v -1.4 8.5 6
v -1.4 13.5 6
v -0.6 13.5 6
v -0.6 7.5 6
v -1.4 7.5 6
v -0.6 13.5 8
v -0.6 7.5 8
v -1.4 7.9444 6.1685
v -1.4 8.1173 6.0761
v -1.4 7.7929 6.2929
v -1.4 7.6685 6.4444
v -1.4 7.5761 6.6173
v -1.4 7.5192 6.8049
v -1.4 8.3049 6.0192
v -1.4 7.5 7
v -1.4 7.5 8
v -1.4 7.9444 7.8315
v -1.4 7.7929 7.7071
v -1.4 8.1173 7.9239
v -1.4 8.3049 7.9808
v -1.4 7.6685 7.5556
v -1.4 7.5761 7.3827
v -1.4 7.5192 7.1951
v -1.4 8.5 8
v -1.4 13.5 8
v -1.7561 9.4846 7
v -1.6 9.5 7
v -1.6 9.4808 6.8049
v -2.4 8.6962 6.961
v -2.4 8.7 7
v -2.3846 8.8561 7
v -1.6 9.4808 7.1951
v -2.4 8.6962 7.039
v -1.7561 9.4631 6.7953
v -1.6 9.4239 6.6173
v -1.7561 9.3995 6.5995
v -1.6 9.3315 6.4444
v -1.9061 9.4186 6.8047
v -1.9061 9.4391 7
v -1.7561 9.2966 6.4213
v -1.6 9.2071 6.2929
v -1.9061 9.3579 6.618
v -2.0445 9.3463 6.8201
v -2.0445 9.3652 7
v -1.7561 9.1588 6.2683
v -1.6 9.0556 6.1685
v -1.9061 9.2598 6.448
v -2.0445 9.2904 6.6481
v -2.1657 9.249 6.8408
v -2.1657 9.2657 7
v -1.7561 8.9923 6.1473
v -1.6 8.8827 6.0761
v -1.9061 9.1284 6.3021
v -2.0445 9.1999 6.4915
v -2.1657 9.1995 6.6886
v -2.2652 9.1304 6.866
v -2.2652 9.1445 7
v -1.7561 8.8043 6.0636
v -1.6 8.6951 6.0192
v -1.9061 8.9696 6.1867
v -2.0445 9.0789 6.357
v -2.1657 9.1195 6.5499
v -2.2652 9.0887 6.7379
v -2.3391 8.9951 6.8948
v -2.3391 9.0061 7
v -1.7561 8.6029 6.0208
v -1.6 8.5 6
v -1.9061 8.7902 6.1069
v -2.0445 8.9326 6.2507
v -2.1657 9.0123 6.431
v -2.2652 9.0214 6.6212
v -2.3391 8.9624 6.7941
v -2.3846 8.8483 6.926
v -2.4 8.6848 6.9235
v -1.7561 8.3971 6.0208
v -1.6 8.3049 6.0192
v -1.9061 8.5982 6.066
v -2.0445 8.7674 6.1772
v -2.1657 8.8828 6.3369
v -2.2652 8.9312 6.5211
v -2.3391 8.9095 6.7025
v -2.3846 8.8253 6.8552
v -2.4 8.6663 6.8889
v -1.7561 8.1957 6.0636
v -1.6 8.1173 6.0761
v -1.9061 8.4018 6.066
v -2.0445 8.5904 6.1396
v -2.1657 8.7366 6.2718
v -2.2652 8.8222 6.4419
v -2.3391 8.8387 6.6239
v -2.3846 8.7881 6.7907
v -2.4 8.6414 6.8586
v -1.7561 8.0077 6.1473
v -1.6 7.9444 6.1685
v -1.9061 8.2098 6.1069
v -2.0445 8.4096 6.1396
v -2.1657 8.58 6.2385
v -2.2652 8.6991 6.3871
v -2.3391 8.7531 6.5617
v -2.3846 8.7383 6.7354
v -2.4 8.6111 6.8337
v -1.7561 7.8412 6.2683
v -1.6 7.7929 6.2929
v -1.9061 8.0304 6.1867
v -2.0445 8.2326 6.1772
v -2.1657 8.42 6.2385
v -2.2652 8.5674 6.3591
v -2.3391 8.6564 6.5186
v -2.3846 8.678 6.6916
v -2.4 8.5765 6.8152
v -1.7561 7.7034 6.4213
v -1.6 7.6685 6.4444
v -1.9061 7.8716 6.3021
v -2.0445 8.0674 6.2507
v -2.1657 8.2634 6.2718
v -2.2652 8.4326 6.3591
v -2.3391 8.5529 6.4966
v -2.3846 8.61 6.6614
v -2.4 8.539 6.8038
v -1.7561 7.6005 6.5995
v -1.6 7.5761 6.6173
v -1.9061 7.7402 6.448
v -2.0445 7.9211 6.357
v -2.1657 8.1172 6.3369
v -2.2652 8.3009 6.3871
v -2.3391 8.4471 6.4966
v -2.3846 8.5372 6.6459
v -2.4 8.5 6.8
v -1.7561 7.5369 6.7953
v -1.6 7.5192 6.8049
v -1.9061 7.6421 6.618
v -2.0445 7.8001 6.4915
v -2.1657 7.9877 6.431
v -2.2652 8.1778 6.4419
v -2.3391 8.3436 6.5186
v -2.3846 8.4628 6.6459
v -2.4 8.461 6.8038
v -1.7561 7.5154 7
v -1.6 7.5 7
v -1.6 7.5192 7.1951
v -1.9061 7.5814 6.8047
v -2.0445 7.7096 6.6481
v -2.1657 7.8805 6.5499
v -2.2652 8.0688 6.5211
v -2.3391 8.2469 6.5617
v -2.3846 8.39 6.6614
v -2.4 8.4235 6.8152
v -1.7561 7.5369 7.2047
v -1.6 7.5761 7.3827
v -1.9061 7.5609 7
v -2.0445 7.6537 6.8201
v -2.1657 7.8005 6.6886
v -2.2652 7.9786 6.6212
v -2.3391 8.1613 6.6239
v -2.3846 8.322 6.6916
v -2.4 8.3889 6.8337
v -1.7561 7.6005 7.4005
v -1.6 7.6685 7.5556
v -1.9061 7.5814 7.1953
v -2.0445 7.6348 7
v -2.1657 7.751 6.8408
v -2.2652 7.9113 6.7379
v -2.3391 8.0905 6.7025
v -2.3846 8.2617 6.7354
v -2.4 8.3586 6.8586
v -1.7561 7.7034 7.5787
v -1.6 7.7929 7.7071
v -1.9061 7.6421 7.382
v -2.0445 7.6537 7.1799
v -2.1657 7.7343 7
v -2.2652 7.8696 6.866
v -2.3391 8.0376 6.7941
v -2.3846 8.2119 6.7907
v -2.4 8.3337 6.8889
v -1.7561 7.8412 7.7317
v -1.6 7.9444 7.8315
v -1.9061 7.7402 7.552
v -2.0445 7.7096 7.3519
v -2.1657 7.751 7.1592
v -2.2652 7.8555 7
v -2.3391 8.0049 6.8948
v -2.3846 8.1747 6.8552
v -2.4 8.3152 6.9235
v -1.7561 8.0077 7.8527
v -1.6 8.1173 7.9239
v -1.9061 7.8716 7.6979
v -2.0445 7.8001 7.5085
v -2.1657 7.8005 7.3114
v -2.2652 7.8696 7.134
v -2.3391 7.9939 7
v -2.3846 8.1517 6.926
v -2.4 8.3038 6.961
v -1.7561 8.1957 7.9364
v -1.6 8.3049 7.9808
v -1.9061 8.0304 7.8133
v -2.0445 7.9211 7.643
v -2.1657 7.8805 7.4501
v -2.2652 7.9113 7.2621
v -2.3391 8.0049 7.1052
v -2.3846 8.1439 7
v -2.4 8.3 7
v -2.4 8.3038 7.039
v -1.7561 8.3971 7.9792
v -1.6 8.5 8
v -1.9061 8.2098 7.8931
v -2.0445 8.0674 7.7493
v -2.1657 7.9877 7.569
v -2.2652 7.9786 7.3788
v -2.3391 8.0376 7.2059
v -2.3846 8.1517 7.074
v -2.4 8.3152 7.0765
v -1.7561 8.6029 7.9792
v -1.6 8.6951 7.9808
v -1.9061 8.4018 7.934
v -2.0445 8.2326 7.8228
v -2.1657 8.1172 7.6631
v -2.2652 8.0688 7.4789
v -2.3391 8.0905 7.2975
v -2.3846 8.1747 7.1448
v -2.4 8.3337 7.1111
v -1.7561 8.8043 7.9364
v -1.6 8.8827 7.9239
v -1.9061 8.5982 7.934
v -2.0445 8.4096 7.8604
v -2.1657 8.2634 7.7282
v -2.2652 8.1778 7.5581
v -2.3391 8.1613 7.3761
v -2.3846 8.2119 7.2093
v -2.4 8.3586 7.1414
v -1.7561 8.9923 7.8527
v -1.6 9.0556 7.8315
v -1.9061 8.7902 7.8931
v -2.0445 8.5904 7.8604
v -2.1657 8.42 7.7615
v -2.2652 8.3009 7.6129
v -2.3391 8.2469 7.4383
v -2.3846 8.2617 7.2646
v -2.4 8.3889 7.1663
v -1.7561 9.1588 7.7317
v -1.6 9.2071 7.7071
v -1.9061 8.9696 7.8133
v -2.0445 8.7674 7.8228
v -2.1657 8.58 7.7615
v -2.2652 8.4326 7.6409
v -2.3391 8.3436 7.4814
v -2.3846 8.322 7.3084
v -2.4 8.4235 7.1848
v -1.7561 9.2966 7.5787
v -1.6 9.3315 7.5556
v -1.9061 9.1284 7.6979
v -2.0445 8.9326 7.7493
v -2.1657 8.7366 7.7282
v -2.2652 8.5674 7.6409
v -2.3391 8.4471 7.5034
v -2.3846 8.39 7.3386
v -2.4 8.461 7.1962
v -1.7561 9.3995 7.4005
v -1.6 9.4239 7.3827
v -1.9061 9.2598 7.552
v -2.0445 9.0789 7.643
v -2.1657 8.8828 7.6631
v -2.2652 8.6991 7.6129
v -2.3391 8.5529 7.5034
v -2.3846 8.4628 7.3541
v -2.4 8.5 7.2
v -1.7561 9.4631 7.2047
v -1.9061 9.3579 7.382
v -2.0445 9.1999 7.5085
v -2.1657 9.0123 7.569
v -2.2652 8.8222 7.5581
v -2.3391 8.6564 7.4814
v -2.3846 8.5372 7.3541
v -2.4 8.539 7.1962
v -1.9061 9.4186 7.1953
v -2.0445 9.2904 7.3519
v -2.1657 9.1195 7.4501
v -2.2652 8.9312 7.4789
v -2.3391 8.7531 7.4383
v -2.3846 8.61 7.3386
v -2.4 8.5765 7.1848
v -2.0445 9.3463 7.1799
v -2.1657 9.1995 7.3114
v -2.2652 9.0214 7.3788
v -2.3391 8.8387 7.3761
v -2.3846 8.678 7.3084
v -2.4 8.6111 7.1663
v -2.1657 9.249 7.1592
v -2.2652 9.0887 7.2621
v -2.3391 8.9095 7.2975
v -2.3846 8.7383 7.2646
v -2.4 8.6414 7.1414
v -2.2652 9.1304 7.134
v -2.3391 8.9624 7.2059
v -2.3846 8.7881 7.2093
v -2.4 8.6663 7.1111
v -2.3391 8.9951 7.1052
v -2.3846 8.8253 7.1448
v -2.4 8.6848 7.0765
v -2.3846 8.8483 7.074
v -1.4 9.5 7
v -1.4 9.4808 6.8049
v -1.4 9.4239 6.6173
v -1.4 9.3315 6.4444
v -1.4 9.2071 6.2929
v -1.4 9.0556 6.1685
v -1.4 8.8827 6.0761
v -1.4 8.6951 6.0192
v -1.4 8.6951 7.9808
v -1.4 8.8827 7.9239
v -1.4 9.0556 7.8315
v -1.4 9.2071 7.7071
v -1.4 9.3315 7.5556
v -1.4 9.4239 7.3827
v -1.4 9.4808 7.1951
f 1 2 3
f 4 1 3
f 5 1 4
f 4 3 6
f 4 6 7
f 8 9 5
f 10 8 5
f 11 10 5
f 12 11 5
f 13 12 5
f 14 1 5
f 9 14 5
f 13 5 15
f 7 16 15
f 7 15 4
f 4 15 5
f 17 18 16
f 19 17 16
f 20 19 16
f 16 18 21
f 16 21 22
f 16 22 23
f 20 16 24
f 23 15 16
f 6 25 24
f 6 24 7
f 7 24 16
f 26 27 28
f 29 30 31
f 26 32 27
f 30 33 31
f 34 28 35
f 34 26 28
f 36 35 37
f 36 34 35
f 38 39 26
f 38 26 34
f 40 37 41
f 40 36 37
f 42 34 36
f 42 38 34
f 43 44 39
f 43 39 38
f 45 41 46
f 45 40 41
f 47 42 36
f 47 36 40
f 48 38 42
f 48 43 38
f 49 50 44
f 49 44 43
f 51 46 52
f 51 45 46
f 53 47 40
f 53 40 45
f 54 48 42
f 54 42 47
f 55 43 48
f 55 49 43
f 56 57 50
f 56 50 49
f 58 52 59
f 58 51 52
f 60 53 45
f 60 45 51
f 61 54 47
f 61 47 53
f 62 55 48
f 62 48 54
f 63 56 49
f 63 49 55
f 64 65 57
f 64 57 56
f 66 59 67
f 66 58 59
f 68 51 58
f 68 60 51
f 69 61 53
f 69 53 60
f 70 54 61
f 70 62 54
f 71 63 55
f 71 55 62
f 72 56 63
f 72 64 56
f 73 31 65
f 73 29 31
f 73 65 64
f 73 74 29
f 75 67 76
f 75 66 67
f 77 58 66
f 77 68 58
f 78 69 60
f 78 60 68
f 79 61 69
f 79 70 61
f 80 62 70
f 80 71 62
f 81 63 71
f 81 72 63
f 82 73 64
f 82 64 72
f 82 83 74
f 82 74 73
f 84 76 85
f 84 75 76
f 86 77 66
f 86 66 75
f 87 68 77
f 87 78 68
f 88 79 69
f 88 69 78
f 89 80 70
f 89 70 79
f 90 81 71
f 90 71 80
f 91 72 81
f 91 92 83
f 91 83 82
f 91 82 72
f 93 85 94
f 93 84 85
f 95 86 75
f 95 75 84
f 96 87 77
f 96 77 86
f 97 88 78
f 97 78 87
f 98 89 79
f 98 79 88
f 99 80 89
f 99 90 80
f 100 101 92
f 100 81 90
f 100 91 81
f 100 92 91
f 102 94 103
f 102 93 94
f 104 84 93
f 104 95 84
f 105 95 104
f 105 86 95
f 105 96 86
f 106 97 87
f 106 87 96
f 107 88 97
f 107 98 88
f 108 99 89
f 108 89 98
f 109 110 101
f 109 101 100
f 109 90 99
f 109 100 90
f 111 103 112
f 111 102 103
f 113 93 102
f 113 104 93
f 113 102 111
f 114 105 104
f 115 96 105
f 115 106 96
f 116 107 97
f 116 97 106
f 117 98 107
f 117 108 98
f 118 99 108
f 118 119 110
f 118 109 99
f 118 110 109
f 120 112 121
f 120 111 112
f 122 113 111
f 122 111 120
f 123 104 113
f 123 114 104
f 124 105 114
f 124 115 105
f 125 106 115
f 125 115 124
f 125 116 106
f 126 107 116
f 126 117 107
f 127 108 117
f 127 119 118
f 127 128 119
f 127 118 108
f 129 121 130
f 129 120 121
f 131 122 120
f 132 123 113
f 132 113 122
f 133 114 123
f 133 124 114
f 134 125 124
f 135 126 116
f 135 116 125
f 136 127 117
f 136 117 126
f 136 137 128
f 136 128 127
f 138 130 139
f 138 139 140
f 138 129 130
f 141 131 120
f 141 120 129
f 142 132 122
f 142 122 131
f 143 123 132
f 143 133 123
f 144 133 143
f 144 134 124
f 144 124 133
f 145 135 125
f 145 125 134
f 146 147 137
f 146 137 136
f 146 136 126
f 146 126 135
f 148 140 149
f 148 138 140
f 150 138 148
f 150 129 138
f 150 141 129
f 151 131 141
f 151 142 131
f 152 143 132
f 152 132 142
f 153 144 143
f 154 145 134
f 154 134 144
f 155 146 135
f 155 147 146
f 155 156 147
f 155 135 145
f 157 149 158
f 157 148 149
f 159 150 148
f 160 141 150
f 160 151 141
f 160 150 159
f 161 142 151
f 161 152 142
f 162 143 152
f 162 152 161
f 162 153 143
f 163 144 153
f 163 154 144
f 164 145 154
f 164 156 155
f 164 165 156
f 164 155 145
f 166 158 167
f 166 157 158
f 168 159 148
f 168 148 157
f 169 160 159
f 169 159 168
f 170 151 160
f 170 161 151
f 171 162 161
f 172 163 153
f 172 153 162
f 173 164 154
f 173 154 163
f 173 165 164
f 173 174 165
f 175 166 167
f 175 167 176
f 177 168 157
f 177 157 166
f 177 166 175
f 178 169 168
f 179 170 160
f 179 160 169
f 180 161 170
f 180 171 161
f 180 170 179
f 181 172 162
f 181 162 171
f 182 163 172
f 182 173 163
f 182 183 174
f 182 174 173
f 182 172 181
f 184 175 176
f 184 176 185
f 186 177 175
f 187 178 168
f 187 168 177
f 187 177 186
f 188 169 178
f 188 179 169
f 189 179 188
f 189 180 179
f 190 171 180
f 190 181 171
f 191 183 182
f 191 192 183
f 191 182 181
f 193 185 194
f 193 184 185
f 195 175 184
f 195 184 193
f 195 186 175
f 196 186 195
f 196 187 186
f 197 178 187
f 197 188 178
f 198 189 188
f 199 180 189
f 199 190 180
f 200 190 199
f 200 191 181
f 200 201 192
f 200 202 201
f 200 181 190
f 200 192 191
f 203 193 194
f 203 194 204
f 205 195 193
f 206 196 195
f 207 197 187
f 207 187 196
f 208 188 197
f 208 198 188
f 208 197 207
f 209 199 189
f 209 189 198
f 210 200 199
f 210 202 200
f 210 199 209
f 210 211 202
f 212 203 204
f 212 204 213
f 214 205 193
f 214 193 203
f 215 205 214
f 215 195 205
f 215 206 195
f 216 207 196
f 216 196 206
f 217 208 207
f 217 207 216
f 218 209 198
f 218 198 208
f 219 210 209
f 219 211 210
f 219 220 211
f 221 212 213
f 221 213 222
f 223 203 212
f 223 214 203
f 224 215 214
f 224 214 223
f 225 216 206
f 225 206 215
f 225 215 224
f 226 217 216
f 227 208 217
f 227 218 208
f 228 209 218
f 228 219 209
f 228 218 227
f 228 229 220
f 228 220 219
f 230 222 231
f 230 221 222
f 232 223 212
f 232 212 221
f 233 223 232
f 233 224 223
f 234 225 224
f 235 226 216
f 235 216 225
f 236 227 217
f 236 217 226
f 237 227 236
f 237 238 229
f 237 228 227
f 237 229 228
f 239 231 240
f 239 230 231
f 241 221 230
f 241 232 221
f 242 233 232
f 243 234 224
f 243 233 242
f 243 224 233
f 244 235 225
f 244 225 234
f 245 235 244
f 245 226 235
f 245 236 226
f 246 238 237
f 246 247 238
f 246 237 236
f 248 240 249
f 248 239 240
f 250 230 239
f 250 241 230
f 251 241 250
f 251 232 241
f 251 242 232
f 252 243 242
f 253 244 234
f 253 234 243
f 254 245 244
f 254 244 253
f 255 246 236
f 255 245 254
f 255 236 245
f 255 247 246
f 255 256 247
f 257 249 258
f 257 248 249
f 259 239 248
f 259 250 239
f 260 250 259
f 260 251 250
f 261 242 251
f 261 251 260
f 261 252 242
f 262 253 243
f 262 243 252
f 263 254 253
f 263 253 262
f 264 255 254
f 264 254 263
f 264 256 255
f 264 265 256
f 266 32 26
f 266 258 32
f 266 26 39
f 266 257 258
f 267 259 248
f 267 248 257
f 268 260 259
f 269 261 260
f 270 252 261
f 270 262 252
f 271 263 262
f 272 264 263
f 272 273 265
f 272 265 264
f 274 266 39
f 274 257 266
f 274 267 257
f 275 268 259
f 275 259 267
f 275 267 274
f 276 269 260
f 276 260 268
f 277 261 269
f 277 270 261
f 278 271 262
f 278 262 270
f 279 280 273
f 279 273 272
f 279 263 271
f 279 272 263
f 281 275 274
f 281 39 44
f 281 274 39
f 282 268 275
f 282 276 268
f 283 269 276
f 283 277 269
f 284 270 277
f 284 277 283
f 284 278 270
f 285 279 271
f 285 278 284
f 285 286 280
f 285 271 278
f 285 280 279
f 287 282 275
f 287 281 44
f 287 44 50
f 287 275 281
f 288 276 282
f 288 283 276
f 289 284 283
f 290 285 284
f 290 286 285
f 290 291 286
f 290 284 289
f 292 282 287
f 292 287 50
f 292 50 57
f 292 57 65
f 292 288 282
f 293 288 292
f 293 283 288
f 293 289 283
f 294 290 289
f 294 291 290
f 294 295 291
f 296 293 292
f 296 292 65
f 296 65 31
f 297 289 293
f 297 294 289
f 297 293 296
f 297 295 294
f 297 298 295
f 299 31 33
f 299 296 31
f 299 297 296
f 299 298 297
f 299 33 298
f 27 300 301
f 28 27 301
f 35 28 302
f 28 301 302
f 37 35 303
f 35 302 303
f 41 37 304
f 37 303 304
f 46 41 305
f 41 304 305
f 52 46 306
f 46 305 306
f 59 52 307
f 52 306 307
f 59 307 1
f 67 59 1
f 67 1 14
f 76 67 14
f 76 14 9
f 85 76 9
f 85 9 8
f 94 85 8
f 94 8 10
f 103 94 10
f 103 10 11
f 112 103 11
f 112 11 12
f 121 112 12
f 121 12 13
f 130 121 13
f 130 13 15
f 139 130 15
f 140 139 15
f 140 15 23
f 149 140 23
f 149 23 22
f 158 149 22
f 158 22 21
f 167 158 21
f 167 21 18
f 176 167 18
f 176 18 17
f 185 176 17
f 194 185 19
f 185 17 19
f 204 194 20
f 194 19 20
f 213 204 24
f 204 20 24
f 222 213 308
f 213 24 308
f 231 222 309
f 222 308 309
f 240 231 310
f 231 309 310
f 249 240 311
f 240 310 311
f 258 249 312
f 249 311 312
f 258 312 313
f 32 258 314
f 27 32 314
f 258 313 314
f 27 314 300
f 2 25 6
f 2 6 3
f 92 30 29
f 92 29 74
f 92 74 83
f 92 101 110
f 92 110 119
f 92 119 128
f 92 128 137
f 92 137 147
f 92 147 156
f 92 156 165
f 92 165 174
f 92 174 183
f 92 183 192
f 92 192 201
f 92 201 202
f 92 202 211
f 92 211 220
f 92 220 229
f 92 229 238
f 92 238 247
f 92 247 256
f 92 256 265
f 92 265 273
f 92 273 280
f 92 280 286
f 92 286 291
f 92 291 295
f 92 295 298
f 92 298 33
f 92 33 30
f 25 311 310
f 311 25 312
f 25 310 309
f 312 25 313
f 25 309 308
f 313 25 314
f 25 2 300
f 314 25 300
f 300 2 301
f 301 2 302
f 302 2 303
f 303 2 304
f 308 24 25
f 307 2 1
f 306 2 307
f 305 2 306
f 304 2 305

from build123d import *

# Parameters (mm, degrees)
SKETCH019_W  = 6
SKETCH019_H  = 2
PAD002_DEPTH = 0.8
SKETCH020_R  = 1
PAD003_DEPTH = 1
FILLET002_R  = 0.8


with BuildPart() as part:
    # Sketch019 → Pad002 (new body)
    with BuildSketch(Plane(origin=(-3, 16, 14), x_dir=(0, -1, 0), z_dir=(1, 0, 0))):
        with Locations((3, 1)):
            Rectangle(SKETCH019_W, SKETCH019_H)
    extrude(amount=PAD002_DEPTH)

    # Sketch020 (on Face5 of Pad002) → Pad003 (join)
    with BuildSketch(Plane(origin=(-3, 0, 0), x_dir=(0, 1, 0), z_dir=(-1, 0, 0))):
        with Locations((11, -13)):
            Circle(SKETCH020_R)
    extrude(amount=PAD003_DEPTH)

    # Fillet002
    fillet002_edges = [part.edges().sort_by_distance(p)[0] for p in [
        (-4, 10, 13),
    ]]
    fillet(fillet002_edges, radius=FILLET002_R)


with BuildPart() as part_1:
    # Body002 placement: moved
    add(part.part.moved(Location((-16, 0, 0))))


with BuildPart() as part_2:
    # Body003 placement: moved
    add(part_1.part.moved(Location((17.6, -2.5, -6))))


solid = part_2.part
